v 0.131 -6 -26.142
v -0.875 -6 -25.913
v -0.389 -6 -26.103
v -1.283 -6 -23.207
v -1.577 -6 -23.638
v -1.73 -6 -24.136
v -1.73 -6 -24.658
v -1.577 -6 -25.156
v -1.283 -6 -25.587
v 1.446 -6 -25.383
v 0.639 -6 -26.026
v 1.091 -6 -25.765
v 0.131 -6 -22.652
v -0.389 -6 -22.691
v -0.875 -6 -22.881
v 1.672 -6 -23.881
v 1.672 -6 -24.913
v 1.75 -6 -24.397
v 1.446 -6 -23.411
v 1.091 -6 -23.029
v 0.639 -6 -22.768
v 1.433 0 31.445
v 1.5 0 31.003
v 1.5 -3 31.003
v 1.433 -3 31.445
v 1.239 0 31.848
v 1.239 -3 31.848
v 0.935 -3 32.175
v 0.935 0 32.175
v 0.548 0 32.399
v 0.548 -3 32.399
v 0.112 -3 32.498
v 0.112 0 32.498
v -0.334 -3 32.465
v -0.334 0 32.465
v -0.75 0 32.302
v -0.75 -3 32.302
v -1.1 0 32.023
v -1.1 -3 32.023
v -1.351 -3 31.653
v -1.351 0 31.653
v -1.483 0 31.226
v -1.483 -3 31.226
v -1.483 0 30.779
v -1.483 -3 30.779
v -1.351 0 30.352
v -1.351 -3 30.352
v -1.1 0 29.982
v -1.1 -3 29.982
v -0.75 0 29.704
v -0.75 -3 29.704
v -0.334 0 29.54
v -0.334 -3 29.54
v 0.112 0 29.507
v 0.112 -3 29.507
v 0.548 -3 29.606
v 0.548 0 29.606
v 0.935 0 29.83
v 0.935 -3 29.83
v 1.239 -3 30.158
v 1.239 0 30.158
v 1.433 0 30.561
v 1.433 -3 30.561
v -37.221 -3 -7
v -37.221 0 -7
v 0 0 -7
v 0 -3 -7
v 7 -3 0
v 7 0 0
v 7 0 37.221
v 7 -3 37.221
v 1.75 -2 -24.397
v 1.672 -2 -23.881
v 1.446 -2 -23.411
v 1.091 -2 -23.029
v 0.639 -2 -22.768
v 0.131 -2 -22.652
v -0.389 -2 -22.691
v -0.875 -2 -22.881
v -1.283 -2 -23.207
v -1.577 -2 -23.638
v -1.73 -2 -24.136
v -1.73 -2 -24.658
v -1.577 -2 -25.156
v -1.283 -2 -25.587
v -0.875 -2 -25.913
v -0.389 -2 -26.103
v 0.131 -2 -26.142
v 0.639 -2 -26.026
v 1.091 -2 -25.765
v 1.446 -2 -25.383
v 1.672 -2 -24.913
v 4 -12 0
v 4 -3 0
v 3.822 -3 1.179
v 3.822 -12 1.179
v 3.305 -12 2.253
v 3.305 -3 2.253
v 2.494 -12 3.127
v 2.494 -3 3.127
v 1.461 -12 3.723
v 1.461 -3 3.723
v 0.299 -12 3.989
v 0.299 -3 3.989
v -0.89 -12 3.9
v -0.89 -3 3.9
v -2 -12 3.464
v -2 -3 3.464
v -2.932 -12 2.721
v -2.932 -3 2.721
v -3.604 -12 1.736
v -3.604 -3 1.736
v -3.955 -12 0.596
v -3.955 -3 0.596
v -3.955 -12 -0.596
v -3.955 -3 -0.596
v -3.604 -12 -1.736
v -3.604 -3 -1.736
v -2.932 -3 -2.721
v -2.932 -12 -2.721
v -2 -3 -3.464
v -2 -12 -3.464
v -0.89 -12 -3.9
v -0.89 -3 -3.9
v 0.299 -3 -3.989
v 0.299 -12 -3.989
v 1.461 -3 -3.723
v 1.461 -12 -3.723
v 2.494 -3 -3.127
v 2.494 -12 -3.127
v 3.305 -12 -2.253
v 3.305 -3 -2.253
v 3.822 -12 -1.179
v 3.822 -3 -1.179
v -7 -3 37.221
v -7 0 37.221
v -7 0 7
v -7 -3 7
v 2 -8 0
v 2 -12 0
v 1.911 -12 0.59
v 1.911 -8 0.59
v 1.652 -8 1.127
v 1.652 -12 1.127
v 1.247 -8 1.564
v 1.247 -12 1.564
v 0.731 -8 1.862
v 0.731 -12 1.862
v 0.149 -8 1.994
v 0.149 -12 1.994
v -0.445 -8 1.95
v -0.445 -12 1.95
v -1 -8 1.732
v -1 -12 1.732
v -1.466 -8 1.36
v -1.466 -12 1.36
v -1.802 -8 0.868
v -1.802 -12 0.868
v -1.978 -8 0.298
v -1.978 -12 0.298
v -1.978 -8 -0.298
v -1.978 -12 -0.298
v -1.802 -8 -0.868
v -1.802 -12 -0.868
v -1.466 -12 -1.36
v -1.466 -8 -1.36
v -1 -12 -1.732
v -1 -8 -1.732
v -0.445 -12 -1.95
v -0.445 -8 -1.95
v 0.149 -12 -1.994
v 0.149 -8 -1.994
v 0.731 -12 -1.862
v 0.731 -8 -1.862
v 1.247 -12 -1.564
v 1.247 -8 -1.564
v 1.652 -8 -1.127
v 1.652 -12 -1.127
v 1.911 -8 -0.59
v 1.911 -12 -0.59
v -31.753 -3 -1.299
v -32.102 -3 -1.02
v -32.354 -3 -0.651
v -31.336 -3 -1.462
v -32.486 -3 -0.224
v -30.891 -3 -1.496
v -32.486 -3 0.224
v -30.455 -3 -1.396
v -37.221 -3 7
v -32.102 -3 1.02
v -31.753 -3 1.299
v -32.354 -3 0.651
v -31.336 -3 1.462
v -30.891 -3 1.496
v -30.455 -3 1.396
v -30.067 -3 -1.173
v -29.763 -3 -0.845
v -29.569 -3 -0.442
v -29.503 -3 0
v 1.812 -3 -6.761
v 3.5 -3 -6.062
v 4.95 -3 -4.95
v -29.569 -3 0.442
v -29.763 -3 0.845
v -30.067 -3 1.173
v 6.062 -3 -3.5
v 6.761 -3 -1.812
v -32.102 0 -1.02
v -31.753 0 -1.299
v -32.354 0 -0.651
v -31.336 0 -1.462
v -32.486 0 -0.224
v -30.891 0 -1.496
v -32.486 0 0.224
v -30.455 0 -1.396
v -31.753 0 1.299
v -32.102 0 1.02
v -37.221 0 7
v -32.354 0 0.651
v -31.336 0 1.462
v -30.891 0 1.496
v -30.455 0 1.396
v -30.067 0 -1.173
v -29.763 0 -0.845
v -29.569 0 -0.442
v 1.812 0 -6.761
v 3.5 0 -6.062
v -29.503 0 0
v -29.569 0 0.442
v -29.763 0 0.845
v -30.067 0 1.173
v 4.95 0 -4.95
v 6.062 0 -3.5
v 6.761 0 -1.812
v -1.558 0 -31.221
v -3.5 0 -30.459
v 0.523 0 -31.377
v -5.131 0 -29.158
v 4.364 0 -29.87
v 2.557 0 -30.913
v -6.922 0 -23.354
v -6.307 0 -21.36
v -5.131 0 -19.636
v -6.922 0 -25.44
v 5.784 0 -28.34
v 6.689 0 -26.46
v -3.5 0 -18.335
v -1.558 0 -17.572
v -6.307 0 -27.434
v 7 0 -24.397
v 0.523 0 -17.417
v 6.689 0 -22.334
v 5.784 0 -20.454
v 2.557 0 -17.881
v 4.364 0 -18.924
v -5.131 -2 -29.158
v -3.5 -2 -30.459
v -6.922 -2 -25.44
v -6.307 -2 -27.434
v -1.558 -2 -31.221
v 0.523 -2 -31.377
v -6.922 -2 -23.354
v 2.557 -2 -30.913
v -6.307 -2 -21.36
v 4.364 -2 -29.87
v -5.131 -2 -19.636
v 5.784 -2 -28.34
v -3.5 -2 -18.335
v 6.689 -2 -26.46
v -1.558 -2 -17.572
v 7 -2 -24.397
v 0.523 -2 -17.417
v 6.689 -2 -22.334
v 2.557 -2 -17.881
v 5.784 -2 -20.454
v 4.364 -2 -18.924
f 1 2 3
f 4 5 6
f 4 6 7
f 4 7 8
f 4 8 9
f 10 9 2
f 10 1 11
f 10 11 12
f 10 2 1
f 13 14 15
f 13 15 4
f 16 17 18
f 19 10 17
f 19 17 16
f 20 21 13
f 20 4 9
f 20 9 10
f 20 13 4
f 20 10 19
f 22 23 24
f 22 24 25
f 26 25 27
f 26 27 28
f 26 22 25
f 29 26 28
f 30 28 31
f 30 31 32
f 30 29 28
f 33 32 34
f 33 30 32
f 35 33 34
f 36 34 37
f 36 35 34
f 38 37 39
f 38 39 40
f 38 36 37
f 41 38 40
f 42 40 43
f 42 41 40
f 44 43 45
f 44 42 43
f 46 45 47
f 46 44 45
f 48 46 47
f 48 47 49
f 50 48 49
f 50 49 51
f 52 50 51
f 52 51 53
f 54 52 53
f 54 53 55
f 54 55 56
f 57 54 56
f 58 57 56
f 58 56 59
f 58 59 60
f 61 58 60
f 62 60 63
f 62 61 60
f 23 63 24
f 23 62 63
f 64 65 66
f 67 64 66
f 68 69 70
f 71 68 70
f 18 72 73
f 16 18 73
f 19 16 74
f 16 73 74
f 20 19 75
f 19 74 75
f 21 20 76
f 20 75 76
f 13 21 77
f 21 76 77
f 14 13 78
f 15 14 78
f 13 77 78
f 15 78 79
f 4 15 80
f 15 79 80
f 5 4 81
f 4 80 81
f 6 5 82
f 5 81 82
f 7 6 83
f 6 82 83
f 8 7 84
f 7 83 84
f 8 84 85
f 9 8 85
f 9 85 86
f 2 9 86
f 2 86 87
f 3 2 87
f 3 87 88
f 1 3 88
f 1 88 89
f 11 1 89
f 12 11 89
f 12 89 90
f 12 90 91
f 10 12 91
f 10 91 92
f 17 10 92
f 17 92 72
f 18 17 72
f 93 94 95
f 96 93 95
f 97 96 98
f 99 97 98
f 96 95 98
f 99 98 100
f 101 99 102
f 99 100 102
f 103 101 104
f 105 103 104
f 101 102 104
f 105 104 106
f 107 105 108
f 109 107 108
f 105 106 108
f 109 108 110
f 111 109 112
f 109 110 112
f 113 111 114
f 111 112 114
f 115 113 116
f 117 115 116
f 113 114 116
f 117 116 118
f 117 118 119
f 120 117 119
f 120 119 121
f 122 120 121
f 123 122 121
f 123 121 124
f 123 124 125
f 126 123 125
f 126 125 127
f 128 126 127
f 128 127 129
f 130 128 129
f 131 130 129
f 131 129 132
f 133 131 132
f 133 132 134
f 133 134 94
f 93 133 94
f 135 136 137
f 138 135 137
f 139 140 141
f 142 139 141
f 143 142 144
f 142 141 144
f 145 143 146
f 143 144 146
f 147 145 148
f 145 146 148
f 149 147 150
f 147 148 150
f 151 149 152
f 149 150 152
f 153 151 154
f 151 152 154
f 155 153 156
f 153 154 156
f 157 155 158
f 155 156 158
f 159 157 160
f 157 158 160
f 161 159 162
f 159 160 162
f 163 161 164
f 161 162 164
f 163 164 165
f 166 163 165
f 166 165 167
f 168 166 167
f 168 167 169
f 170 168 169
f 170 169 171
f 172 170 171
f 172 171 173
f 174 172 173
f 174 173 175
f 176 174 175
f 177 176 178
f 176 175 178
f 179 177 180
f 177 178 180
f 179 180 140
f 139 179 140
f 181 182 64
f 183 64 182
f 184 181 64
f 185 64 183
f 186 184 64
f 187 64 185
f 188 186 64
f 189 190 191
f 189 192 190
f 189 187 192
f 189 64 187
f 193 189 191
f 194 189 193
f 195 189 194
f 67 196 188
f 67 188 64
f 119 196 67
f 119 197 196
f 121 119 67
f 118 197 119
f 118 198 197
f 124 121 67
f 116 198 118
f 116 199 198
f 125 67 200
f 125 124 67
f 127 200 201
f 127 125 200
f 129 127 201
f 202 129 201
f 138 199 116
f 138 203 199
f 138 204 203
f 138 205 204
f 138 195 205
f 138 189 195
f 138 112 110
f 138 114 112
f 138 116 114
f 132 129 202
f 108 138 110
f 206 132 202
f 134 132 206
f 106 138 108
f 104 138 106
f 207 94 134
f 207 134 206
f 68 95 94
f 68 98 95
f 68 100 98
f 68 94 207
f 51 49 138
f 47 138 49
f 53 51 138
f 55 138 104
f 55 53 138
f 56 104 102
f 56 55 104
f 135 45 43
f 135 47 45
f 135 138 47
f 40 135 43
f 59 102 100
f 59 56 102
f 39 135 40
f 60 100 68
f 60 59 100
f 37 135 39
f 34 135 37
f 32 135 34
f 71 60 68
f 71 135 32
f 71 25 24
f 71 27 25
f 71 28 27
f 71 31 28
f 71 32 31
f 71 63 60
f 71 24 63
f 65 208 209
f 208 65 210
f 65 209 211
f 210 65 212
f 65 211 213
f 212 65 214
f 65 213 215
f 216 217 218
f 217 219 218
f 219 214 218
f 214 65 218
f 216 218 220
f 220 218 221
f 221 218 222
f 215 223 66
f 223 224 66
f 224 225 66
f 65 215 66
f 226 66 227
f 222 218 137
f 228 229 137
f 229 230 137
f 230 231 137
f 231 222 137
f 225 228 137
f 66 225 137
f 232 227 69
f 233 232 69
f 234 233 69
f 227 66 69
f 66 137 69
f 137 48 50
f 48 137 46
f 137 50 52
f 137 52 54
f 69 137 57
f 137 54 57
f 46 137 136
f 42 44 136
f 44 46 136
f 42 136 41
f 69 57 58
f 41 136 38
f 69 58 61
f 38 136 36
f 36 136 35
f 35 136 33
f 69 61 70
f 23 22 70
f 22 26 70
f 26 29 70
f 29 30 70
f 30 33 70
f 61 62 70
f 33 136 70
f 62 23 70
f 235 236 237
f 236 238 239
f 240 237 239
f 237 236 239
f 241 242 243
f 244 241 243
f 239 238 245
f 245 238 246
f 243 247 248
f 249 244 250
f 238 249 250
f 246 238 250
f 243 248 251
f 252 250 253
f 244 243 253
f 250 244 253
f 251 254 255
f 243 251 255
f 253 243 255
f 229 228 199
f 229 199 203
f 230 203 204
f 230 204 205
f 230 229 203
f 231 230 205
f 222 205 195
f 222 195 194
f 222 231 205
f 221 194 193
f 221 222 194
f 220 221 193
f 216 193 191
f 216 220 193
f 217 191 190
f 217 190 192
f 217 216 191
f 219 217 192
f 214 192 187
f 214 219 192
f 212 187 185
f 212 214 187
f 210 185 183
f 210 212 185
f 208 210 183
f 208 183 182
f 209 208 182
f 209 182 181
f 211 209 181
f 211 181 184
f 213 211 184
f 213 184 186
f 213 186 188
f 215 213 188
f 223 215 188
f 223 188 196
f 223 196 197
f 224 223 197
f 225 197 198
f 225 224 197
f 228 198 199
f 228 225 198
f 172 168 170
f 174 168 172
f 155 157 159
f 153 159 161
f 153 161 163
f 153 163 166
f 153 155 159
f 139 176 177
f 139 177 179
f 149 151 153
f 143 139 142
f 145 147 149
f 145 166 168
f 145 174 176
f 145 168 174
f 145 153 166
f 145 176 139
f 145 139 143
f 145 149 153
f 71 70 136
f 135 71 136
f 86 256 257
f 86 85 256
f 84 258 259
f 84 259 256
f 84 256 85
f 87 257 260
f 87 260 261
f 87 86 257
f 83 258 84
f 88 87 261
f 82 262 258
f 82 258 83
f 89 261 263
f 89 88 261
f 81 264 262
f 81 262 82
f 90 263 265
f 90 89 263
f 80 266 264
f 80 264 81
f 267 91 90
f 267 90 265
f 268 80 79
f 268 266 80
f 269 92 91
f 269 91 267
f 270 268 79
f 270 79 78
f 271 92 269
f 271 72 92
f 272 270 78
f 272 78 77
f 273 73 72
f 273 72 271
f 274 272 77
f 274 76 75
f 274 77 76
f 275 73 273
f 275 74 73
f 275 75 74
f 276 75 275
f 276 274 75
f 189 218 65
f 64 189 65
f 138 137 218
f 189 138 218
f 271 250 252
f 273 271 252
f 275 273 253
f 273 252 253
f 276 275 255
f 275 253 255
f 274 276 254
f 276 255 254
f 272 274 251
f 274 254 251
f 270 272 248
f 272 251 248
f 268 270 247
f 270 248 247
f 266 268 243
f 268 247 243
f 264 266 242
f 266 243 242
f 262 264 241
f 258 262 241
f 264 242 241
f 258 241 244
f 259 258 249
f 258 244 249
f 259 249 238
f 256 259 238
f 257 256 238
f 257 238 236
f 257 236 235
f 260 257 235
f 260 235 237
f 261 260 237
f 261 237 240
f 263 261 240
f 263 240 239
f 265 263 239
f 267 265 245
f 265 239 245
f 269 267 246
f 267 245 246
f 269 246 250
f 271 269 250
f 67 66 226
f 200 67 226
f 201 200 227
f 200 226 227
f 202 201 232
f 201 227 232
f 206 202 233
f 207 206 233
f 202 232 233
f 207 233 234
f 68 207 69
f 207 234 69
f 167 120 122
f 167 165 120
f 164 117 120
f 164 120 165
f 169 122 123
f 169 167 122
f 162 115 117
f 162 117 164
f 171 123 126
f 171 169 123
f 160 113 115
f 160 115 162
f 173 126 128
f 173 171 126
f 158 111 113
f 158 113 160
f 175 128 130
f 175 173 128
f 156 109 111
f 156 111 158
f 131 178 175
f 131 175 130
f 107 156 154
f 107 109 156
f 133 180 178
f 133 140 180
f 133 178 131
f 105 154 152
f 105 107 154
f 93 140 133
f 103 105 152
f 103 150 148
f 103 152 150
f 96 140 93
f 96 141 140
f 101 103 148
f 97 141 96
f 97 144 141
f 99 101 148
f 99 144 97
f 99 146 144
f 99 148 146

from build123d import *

# Parameters (mm, degrees)
F0_R     = 1.5
F0_R_2   = 4
F1_DEPTH = 3
F2_DEPTH = 12
F4_R     = 7
F4_R_2   = 1.75
F5_DEPTH = 2
F6_DEPTH = 6
F3_R     = 2
F7_DEPTH = 4


with BuildPart() as f1:
    # F0 (on Front) → F1 (new body)
    with BuildSketch(Plane.XZ):
        with BuildLine():
            Line((-37.220689, -7), (0, -7))
            ThreePointArc((0, -7), (4.949747, -4.949747), (7, 0))
            Line((7, 0), (7, 37.220689))
            Line((7, 37.220689), (-7, 37.220689))
            Line((-7, 37.220689), (-7, 7))
            Line((-7, 7), (-37.220689, 7))
            Line((-37.220689, 7), (-37.220689, -7))
        make_face()
        with Locations((-31.002669, 0)):
            Circle(F0_R, mode=Mode.SUBTRACT)
        Circle(F0_R_2, mode=Mode.SUBTRACT)
        with Locations((0, 31.002669)):
            Circle(F0_R, mode=Mode.SUBTRACT)
    extrude(amount=F1_DEPTH)

    # F0 (on Front) → F2 (join)
    with BuildSketch(Plane.XZ):
        Circle(F0_R_2)
    extrude(amount=F2_DEPTH)

    # F3 (on face) → F7 (cut)
    with BuildSketch(Plane.XZ.offset(12)):
        Circle(F3_R)
    extrude(amount=-F7_DEPTH, mode=Mode.SUBTRACT)


with BuildPart() as f5:
    # F4 (on Front) → F5 (new body)
    with BuildSketch(Plane.XZ):
        with Locations((0, -24.396977)):
            Circle(F4_R)
        with Locations((0, -24.396977)):
            Circle(F4_R_2, mode=Mode.SUBTRACT)
    extrude(amount=F5_DEPTH)

    # F4 (on Front) → F6 (join)
    with BuildSketch(Plane.XZ):
        with Locations((0, -24.396977)):
            Circle(F4_R_2)
    extrude(amount=F6_DEPTH)


solid = Compound([f1.part, f5.part])
